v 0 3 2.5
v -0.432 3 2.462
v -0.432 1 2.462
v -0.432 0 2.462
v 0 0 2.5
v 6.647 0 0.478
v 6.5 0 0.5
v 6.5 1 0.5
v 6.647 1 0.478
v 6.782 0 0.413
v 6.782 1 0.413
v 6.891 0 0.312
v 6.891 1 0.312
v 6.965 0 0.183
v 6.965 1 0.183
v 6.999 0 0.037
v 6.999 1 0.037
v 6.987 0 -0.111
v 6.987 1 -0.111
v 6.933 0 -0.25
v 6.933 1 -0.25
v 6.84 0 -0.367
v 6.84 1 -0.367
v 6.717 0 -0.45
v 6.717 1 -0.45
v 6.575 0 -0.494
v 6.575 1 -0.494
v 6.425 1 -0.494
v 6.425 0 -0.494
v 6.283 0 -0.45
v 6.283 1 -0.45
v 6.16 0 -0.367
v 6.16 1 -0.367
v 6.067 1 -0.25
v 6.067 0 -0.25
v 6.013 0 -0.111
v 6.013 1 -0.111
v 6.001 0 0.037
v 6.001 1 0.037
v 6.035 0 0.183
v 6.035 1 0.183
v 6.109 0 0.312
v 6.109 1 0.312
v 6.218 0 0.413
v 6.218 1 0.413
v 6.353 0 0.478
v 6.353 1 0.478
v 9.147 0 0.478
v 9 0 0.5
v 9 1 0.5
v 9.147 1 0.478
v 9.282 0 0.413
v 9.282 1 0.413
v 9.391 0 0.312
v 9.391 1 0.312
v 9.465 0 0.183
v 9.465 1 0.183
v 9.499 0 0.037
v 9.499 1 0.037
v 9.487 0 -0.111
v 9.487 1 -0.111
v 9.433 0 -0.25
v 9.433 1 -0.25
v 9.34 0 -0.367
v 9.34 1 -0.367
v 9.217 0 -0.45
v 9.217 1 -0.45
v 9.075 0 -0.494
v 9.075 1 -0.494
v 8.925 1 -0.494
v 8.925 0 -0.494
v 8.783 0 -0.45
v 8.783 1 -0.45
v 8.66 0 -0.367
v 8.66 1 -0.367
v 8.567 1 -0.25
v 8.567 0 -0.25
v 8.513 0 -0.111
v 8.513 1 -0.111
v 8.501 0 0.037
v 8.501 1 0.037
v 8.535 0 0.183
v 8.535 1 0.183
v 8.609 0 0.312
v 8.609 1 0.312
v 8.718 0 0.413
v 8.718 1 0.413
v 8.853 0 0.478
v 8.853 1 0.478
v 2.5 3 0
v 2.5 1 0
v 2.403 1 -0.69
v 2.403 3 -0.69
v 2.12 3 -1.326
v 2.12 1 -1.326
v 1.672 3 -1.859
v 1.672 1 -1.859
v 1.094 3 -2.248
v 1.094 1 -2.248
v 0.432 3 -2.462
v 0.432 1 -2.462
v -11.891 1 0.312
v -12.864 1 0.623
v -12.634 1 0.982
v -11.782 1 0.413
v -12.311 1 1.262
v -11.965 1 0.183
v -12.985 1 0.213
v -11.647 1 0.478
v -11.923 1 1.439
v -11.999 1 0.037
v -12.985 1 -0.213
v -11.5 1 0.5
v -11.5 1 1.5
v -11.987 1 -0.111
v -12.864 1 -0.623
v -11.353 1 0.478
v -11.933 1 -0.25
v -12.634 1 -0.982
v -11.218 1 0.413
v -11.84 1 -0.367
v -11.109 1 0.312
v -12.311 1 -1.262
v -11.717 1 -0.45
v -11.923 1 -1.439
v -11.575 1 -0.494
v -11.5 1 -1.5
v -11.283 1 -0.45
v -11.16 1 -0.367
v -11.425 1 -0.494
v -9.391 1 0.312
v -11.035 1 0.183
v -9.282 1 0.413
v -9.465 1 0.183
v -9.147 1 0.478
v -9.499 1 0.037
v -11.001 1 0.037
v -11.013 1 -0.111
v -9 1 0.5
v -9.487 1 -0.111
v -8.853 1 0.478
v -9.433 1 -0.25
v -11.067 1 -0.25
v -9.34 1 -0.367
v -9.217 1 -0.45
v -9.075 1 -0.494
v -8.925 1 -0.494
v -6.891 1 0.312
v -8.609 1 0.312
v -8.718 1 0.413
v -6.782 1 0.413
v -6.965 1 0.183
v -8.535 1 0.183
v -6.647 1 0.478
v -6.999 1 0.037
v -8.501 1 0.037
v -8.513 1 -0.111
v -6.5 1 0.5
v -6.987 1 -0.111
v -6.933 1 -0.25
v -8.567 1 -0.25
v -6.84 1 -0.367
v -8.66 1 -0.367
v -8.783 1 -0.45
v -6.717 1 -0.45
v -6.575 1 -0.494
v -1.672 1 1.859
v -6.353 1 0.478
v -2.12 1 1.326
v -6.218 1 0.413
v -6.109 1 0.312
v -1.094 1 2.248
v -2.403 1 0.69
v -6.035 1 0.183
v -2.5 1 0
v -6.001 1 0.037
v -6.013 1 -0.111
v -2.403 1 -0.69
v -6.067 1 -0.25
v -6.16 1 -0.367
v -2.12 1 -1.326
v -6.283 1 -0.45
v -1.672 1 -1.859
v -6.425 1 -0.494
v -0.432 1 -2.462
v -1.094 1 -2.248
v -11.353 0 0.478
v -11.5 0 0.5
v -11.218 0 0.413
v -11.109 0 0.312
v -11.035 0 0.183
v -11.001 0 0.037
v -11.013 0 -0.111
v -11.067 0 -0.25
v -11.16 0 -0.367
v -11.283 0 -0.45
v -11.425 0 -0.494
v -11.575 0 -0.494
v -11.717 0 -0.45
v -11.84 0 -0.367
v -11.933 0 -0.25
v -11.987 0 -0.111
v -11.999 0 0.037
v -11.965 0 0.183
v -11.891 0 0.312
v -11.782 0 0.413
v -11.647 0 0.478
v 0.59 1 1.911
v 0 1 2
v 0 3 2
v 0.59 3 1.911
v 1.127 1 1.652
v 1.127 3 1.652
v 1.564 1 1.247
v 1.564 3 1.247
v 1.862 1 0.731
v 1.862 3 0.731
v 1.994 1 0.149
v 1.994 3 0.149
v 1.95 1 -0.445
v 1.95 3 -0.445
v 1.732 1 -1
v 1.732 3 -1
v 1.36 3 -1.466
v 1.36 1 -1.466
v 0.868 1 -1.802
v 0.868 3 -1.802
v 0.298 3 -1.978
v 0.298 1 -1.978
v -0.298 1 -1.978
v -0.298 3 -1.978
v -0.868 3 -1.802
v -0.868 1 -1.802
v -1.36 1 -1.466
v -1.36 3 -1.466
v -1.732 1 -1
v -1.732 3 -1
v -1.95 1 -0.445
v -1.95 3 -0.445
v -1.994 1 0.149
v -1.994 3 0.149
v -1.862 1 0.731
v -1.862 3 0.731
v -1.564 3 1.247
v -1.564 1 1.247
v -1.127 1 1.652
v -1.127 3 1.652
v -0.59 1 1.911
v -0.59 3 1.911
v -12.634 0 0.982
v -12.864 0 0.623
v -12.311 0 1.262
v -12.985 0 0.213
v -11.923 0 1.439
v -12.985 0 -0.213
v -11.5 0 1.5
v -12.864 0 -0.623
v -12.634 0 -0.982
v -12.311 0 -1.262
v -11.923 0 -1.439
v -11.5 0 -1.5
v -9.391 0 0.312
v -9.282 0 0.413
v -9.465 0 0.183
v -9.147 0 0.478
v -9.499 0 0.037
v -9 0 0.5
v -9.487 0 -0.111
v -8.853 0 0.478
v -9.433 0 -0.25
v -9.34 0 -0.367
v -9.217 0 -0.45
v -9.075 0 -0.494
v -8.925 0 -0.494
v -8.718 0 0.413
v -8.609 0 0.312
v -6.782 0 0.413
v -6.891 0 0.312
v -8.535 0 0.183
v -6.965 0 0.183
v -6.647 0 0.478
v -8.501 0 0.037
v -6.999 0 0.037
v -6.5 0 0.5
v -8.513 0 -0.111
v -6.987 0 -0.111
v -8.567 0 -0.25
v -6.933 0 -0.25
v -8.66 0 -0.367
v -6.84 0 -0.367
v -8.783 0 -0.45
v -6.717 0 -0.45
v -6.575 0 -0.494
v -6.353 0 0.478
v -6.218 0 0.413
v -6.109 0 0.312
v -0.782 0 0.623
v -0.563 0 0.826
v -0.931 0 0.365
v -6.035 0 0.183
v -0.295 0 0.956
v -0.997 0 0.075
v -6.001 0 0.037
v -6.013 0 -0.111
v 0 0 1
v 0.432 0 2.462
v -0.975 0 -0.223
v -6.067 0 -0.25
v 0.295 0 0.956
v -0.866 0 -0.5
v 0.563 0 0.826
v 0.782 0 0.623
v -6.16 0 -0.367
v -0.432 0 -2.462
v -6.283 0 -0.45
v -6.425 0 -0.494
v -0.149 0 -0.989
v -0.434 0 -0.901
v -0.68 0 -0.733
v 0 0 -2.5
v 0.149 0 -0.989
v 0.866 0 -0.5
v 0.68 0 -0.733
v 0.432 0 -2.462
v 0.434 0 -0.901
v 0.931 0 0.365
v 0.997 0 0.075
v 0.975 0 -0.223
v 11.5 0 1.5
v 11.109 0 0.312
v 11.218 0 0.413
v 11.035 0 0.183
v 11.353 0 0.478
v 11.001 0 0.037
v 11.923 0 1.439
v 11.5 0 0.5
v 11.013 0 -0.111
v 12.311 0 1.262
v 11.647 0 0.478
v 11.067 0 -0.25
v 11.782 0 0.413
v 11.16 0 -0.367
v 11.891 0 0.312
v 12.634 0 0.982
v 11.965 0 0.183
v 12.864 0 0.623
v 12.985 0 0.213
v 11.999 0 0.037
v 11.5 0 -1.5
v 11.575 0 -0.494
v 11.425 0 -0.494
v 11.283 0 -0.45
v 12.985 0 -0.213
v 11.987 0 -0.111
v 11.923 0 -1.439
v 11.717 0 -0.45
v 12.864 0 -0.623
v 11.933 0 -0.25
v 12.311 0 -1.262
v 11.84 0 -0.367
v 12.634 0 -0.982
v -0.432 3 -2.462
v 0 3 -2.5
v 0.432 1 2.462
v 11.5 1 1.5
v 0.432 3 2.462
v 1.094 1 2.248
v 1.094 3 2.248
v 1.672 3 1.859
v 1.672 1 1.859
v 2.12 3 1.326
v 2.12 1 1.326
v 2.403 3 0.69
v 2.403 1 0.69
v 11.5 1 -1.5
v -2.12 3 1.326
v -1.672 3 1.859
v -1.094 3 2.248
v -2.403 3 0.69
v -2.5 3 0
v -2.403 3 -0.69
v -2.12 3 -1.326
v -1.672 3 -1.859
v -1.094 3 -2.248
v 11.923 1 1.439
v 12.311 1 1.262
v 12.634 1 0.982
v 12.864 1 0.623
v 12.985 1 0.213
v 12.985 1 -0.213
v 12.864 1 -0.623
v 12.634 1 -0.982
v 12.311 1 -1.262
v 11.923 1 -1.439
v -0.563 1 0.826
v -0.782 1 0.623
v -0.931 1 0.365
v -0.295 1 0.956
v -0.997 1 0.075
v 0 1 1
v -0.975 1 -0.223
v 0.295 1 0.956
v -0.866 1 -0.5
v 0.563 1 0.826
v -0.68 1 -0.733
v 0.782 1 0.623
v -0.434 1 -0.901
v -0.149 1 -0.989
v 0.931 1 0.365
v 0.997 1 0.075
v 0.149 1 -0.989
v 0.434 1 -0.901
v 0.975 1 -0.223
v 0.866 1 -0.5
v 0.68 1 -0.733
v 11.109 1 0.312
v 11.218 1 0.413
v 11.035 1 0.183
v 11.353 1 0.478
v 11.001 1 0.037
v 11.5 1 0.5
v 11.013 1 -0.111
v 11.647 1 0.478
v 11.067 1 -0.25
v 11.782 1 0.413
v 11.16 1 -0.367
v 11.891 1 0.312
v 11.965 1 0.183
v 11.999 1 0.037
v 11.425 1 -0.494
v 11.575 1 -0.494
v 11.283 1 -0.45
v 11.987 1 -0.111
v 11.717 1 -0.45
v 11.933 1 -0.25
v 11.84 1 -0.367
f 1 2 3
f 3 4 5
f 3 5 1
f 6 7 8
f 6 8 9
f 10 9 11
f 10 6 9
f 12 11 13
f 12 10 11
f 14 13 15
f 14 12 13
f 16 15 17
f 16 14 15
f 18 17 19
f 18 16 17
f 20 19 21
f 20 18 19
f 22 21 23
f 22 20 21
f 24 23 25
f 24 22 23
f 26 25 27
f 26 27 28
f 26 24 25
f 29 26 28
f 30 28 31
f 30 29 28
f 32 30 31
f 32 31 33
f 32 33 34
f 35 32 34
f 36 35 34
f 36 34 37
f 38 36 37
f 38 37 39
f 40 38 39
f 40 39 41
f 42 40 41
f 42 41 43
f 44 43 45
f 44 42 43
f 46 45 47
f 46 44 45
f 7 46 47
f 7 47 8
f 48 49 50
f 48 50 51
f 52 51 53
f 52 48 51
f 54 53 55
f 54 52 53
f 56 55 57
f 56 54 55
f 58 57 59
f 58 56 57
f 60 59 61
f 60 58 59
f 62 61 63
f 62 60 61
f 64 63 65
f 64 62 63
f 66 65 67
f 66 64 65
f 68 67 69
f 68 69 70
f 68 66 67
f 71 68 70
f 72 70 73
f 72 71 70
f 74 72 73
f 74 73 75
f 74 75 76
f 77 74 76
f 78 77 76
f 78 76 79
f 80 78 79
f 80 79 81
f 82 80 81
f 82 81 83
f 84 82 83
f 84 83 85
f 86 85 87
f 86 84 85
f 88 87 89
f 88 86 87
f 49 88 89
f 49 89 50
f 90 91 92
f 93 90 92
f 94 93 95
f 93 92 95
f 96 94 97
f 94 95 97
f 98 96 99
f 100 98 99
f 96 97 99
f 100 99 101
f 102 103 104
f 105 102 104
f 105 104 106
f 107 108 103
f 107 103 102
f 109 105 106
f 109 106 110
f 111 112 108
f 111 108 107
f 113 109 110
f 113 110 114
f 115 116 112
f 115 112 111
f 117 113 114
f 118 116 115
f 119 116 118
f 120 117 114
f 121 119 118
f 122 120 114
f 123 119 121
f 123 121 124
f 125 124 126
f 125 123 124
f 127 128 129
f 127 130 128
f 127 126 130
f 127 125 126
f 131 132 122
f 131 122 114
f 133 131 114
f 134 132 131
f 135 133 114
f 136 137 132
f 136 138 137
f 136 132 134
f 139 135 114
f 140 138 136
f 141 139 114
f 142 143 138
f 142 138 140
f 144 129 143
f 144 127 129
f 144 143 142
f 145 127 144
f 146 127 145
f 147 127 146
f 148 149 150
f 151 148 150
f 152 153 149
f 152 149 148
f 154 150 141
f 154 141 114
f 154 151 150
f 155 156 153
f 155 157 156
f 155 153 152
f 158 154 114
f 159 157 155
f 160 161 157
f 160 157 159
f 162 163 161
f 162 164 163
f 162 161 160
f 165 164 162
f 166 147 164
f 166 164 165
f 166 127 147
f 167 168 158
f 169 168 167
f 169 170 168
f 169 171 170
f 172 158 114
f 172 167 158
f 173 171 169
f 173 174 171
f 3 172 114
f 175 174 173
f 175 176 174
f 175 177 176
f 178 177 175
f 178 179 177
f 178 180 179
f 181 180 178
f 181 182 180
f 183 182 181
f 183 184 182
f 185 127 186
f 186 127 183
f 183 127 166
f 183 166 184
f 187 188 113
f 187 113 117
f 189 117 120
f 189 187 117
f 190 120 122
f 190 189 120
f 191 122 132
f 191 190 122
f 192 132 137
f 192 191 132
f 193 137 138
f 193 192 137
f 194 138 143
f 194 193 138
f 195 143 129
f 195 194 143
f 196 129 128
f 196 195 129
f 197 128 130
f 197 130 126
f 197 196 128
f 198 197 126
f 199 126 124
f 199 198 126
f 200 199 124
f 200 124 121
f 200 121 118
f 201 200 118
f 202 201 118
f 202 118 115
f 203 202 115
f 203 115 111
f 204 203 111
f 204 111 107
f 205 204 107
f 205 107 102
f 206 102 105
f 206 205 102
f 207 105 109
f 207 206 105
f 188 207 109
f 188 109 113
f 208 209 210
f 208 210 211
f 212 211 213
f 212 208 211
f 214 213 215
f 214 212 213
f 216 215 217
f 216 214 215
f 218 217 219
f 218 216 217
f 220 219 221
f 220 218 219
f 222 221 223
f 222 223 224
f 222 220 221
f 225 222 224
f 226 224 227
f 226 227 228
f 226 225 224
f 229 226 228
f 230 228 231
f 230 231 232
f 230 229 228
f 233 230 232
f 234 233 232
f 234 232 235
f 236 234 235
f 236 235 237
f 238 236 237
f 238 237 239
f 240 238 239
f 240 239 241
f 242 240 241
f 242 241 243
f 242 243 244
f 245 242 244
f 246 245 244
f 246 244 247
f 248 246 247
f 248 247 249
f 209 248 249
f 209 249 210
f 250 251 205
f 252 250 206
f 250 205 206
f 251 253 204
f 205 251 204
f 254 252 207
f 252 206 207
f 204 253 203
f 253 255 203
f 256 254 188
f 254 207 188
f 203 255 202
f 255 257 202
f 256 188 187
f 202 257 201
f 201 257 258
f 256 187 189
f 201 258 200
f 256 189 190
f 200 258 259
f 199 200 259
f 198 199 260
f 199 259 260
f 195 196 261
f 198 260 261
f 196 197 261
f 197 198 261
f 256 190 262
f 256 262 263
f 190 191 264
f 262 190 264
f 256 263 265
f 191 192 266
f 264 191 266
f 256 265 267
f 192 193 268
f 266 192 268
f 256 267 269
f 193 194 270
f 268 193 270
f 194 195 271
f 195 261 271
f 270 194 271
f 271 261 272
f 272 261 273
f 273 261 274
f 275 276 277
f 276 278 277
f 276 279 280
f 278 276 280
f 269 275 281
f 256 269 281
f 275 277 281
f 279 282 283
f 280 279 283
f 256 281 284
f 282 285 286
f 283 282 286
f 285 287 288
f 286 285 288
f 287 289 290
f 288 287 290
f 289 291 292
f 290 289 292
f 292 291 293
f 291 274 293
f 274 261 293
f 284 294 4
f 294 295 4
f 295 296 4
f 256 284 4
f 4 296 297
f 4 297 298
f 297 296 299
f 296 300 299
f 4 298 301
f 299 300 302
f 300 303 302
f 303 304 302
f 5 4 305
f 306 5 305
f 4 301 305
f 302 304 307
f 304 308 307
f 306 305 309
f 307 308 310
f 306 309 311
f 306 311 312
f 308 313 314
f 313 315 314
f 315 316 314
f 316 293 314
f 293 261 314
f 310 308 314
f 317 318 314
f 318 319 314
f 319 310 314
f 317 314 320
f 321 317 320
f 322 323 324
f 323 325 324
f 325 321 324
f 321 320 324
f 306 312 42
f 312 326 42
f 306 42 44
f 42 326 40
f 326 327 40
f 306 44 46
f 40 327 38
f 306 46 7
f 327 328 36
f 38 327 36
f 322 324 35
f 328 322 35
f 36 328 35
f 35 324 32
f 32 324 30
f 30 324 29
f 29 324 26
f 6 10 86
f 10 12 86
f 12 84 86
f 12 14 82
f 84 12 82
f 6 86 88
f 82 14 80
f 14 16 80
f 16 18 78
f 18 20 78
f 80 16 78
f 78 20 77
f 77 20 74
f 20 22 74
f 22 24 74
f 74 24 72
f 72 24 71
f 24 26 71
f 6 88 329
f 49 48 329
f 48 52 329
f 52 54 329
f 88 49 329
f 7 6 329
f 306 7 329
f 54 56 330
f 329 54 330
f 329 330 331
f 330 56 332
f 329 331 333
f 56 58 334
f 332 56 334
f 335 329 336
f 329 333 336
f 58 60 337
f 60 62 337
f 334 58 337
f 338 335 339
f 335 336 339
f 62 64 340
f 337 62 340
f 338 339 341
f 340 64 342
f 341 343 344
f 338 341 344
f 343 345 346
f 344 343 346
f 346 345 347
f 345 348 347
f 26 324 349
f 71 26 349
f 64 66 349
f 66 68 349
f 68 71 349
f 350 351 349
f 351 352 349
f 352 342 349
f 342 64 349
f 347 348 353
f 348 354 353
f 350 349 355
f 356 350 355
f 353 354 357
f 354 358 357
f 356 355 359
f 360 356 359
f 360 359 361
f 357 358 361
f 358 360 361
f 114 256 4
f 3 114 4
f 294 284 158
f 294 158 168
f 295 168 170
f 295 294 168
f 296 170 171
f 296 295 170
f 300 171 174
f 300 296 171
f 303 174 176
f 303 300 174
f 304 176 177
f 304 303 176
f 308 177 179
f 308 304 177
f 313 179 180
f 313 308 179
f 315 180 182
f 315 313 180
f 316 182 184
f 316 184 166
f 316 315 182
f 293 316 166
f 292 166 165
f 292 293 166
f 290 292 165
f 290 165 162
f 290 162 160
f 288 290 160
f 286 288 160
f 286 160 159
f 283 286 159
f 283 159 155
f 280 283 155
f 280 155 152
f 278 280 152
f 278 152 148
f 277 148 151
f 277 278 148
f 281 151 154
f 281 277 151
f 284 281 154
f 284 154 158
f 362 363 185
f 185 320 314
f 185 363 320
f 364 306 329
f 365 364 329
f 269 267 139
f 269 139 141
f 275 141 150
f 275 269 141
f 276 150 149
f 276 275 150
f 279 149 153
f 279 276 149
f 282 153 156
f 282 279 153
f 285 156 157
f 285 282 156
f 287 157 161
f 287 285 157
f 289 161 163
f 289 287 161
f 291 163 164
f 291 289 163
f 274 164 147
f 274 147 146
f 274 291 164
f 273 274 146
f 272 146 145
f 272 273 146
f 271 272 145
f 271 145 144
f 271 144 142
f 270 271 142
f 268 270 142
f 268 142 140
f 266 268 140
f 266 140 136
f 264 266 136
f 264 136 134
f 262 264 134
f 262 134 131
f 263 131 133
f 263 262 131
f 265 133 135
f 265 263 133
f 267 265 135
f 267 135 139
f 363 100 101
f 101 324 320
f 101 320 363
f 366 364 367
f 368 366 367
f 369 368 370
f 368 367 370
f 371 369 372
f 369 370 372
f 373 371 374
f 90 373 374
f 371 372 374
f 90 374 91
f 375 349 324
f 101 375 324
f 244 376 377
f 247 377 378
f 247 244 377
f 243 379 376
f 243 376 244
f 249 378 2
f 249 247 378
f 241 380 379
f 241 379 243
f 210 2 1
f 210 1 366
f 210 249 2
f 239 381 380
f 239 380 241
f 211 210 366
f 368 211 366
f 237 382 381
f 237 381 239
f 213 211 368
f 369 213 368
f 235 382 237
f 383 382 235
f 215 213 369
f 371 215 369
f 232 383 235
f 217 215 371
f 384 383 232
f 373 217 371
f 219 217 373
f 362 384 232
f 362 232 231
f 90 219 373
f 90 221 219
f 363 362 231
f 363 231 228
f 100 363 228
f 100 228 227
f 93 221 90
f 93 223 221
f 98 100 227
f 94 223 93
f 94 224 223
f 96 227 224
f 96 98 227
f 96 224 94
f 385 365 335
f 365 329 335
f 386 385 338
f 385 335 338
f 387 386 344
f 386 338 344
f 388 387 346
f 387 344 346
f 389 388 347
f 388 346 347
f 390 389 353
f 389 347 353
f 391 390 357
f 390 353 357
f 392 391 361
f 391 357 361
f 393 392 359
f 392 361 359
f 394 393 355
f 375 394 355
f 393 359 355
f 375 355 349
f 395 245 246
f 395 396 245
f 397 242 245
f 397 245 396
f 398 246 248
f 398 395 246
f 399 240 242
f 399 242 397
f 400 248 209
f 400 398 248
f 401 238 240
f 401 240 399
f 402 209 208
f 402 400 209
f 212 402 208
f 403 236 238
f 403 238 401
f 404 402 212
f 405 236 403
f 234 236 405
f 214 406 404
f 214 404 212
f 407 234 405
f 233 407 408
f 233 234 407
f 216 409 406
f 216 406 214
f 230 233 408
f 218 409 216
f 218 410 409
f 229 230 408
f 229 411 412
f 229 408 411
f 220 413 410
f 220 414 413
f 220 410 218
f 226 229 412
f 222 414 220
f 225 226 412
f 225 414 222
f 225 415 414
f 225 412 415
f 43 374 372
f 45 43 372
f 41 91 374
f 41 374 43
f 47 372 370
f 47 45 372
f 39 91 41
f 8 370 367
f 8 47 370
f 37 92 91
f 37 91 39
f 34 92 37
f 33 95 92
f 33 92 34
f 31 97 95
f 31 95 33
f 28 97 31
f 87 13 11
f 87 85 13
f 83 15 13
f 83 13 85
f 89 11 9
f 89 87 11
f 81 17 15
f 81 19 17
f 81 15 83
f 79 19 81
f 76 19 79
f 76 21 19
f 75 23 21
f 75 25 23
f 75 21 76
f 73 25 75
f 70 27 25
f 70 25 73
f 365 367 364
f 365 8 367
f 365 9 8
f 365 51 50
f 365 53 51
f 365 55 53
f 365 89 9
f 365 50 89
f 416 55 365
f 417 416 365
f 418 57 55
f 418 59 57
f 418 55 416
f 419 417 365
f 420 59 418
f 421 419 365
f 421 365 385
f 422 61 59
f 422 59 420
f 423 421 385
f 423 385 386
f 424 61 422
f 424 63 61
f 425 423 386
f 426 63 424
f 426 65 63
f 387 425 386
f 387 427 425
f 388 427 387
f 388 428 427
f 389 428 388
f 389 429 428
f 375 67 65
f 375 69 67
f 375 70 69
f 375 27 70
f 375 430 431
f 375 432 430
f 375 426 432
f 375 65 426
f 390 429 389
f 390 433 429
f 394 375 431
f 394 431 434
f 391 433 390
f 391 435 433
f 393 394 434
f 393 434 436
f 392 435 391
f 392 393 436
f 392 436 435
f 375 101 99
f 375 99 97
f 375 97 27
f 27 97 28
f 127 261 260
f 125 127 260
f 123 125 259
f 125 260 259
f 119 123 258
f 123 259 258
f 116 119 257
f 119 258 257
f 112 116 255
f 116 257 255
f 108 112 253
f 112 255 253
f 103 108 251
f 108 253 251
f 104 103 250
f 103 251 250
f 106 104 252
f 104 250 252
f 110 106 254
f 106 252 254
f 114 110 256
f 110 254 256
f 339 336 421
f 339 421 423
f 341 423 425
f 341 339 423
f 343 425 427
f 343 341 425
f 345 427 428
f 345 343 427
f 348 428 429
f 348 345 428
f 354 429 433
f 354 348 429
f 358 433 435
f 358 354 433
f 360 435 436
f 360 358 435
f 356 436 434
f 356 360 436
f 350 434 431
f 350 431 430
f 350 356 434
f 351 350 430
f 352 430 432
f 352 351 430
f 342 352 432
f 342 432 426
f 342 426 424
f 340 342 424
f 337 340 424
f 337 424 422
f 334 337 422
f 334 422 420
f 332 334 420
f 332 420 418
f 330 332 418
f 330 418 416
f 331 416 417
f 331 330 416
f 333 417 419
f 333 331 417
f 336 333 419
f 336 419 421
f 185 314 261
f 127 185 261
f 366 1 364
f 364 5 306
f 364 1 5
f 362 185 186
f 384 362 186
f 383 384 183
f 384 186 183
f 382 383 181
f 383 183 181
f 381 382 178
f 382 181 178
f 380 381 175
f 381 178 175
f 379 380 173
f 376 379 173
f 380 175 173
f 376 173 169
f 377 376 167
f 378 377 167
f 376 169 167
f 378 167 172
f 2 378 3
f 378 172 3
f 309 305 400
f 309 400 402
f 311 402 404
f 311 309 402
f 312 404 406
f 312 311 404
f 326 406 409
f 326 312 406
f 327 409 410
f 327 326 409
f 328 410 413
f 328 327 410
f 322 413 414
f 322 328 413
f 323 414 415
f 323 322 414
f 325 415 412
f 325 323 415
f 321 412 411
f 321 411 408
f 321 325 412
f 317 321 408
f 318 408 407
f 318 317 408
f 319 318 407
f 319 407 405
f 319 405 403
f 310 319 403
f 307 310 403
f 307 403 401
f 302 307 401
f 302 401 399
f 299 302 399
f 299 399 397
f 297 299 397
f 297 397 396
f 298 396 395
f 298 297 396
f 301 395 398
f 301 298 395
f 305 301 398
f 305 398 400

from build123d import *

# Parameters (mm, degrees)
SKETCH1_R           = 0.5
SKETCH1_R_2         = 1
BOSS_EXTRUDE1_DEPTH = 1
SKETCH1_4_R         = 2
BOSS_EXTRUDE2_DEPTH = 3


with BuildPart() as part:
    # Sketch1 → Boss-Extrude1 (new body)
    with BuildSketch(Plane(origin=(0, 0, 0), x_dir=(1, 0, 0), z_dir=(0, 1, 0))):
        with BuildLine():
            ThreePointArc((11.5, -1.5), (13, 0), (11.5, 1.5))
            Line((11.5, 1.5), (0, 2.5))
            Line((0, 2.5), (-11.5, 1.5))
            ThreePointArc((-11.5, 1.5), (-13, 0), (-11.5, -1.5))
            Line((-11.5, -1.5), (0, -2.5))
            Line((0, -2.5), (11.5, -1.5))
        make_face()
        with Locations((6.5, 0)):
            Circle(SKETCH1_R, mode=Mode.SUBTRACT)
        with Locations((9, 0)):
            Circle(SKETCH1_R, mode=Mode.SUBTRACT)
        with Locations((11.5, 0)):
            Circle(SKETCH1_R, mode=Mode.SUBTRACT)
        Circle(SKETCH1_R_2, mode=Mode.SUBTRACT)
        with Locations((-6.5, 0)):
            Circle(SKETCH1_R, mode=Mode.SUBTRACT)
        with Locations((-9, 0)):
            Circle(SKETCH1_R, mode=Mode.SUBTRACT)
        with Locations((-11.5, 0)):
            Circle(SKETCH1_R, mode=Mode.SUBTRACT)
    extrude(amount=BOSS_EXTRUDE1_DEPTH)

    # Sketch1<4> → Boss-Extrude2 (add)
    with BuildSketch(Plane(origin=(0, 0, 0), x_dir=(1, 0, 0), z_dir=(0, 1, 0))):
        with BuildLine():
            ThreePointArc((2.5, 0), (1.914262162, 1.607980216), (0.4315197, 2.462476548))
            Line((0.4315197, 2.462476548), (0, 2.5))
            Line((0, 2.5), (-0.4315197, 2.462476548))
            ThreePointArc((-0.4315197, 2.462476548), (-2.5, 0), (-0.4315197, -2.462476548))
            Line((-0.4315197, -2.462476548), (0, -2.5))
            Line((0, -2.5), (0.4315197, -2.462476548))
            ThreePointArc((0.4315197, -2.462476548), (1.914262162, -1.607980216), (2.5, 0))
        make_face()
        Circle(SKETCH1_4_R, mode=Mode.SUBTRACT)
    extrude(amount=BOSS_EXTRUDE2_DEPTH)


solid = part.part
